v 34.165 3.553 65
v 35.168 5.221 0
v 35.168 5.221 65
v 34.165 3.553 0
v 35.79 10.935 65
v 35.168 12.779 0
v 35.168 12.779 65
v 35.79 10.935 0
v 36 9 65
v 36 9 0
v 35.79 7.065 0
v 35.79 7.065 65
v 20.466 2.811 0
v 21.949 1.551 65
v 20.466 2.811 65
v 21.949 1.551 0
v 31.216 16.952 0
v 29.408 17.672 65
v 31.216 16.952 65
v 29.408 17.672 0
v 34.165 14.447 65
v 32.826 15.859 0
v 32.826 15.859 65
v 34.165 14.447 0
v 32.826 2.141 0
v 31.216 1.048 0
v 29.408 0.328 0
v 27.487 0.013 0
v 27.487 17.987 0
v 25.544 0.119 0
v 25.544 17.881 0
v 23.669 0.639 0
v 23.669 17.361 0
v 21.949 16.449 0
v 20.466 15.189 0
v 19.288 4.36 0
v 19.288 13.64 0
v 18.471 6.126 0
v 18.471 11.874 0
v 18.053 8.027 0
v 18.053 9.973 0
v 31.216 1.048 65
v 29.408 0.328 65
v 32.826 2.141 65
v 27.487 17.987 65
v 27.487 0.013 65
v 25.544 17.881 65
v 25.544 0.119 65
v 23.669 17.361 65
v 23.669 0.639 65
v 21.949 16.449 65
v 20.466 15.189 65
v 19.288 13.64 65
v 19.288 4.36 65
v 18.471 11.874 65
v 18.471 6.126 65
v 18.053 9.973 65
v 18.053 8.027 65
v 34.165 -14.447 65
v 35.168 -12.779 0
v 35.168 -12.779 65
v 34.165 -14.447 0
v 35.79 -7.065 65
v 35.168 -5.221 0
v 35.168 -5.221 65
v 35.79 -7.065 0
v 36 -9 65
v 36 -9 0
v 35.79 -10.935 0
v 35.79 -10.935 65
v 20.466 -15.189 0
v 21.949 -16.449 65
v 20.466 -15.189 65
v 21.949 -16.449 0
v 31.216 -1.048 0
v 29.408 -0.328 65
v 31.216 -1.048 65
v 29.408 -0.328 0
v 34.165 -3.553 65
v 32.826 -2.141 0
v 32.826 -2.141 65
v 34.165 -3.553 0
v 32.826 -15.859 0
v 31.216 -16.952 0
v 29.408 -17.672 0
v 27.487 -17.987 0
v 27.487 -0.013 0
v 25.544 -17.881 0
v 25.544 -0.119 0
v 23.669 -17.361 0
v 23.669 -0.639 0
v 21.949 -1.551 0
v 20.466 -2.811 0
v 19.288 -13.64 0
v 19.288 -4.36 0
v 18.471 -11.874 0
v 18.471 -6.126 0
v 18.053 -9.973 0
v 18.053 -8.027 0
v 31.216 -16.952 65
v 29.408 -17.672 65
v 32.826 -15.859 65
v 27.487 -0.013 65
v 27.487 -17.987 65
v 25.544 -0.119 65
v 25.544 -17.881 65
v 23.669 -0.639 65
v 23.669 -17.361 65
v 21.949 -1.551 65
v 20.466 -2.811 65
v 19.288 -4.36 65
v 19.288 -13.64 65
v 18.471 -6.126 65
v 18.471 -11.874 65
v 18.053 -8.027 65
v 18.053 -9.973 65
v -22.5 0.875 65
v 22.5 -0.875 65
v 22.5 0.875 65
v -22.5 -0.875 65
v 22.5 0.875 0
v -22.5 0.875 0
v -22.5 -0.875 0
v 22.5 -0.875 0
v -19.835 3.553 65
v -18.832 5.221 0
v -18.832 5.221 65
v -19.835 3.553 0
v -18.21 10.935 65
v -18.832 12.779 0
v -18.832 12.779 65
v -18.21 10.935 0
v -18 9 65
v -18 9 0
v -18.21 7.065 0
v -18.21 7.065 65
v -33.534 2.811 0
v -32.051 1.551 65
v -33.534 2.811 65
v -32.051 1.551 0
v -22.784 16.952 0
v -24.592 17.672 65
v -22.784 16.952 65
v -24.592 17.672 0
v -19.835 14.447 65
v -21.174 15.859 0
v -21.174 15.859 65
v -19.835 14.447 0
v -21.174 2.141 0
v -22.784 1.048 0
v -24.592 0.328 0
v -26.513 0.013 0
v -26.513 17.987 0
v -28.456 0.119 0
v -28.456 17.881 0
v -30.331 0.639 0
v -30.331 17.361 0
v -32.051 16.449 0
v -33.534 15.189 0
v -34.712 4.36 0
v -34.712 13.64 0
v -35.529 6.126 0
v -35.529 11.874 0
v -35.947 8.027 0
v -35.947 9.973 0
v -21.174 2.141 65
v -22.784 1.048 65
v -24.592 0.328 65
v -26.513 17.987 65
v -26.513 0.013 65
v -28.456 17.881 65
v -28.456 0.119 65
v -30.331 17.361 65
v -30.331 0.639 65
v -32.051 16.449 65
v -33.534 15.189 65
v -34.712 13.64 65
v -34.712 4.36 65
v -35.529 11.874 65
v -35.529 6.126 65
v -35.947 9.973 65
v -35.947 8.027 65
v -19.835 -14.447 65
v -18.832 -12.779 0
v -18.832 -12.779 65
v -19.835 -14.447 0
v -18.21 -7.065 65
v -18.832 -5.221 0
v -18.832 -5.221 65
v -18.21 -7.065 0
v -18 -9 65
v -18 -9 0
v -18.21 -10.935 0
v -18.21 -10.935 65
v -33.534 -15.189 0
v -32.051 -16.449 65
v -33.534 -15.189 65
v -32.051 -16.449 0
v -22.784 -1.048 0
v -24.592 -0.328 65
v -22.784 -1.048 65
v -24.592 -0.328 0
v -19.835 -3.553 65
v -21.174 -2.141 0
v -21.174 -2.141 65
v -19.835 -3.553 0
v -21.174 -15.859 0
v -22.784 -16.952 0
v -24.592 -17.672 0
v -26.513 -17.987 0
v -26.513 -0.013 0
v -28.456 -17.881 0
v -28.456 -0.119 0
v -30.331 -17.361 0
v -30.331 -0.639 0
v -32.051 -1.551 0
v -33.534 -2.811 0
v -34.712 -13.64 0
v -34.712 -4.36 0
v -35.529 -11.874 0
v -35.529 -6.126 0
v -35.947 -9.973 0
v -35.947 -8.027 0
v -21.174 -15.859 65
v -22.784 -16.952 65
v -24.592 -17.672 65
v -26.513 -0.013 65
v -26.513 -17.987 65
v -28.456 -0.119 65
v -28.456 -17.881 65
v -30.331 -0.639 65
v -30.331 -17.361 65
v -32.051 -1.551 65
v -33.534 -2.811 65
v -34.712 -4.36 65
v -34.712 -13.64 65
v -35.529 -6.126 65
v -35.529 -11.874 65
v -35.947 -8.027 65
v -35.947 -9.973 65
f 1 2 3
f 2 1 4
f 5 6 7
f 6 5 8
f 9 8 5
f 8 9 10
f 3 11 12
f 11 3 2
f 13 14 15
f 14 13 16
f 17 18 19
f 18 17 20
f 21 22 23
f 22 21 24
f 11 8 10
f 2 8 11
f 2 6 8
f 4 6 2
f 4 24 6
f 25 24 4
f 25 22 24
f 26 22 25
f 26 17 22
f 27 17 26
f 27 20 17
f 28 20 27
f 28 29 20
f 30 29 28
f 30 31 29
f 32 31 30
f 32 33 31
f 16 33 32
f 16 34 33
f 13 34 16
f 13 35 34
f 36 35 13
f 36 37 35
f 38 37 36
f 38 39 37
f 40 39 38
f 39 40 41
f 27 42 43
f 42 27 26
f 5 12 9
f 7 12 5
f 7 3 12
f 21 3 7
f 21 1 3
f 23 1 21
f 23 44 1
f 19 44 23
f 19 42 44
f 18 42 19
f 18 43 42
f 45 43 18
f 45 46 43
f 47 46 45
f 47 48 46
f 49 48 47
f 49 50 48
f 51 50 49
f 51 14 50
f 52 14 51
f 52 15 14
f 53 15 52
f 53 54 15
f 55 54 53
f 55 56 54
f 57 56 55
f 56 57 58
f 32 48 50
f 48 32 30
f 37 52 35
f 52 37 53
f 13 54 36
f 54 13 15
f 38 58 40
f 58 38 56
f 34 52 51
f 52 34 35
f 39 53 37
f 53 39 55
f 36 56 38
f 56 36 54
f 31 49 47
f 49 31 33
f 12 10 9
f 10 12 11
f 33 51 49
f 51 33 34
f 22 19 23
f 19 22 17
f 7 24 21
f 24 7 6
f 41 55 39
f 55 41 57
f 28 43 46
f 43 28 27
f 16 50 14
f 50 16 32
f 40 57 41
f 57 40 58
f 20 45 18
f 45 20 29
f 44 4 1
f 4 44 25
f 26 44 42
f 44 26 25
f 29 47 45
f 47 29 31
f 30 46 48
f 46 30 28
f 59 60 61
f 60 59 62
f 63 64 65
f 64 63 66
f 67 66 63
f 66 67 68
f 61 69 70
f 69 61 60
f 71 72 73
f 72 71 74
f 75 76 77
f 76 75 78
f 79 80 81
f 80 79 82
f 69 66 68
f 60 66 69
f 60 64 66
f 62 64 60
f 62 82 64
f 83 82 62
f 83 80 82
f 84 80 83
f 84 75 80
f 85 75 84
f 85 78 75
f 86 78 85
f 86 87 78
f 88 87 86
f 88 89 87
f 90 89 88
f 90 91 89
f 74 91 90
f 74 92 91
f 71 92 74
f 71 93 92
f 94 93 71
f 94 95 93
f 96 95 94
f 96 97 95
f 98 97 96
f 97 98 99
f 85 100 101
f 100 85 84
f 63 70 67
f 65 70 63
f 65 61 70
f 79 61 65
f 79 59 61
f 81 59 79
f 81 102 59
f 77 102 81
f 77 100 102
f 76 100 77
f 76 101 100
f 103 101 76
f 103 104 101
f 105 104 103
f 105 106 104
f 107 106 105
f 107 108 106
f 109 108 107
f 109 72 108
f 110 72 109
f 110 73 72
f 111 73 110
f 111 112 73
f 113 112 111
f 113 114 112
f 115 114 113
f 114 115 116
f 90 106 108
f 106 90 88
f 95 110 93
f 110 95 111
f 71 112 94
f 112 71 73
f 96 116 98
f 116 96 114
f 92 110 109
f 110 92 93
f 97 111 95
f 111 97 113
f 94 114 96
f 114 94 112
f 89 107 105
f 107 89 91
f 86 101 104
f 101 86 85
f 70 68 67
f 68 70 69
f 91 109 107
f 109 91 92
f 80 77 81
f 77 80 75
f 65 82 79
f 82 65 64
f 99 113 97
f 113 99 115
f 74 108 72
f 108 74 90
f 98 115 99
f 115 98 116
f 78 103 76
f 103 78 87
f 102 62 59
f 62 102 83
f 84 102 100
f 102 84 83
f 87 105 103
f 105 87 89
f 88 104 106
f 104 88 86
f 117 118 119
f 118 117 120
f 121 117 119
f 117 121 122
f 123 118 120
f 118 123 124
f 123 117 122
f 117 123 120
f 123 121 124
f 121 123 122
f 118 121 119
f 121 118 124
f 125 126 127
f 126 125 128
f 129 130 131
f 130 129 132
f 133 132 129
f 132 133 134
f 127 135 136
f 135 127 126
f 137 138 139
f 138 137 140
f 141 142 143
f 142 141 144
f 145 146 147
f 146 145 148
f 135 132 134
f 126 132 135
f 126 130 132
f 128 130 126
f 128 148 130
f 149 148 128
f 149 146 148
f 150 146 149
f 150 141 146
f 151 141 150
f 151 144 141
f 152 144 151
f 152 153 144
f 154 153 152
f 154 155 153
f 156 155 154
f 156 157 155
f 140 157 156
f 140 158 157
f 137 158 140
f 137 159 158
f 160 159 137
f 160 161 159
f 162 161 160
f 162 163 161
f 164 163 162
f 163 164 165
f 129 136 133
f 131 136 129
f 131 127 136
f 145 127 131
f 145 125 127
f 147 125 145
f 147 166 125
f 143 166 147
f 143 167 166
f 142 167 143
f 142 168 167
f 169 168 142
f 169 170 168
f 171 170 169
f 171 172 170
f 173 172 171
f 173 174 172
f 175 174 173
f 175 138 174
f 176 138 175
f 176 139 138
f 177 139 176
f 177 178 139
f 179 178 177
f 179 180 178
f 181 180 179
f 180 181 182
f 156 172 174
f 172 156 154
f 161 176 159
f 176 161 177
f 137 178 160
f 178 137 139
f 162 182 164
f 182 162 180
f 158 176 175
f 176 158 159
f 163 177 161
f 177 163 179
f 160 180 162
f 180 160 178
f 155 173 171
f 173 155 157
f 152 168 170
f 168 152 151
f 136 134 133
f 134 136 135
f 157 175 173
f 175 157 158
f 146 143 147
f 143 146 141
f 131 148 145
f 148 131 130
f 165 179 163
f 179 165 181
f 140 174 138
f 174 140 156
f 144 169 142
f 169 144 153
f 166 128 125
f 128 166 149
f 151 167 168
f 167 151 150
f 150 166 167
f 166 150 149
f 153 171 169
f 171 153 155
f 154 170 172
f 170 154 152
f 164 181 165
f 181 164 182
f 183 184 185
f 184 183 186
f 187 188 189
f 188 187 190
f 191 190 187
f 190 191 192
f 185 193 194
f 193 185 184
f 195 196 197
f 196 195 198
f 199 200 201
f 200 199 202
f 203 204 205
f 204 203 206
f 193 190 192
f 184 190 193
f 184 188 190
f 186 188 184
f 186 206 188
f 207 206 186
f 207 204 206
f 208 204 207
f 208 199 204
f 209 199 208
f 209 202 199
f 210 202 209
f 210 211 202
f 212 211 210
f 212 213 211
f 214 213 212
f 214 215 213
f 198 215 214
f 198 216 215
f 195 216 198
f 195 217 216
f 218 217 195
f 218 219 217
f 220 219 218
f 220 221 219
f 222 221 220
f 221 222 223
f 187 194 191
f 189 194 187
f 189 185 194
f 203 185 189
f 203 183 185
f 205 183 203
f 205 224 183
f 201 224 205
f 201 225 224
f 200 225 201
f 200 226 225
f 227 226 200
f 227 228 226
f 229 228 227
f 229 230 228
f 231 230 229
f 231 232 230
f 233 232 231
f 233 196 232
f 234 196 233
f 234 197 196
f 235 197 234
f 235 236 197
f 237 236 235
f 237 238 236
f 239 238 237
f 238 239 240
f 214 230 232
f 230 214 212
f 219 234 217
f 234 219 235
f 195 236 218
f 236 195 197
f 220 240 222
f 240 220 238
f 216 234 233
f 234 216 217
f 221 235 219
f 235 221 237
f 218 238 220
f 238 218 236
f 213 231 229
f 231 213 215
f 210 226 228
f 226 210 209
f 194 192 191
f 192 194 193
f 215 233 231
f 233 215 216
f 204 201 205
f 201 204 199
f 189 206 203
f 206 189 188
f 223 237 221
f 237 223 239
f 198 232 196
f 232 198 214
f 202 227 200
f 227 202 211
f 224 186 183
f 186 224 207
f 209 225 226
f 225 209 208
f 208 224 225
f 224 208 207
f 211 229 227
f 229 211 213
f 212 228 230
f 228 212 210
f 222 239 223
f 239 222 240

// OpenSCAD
$battery_radius = 9;
$board_thickness = 1.75;
$board_width = 45;
$board_height = 65;
$led_placement = 10;
//color("blue", 1.0) translate([0, $board_thickness/2, $board_height-$led_placement])rotate([90, 0, 0])  cylinder(22.5, 3, 45);
translate ([$battery_radius/2+$board_width/2, $battery_radius, 0]) cylinder(65, $battery_radius,$battery_radius);
translate ([$battery_radius/2+$board_width/2, -$battery_radius, 0]) cylinder(65, $battery_radius,$battery_radius);
translate([0, 0, $board_height/2]) rotate ([0, 0,90]) cube([$board_thickness, $board_width, $board_height], true);
translate ([-$battery_radius/2-$board_width/2, $battery_radius, 0]) cylinder(65, $battery_radius,$battery_radius);
translate ([-$battery_radius/2-$board_width/2, -$battery_radius, 0]) cylinder(65, $battery_radius,$battery_radius);
